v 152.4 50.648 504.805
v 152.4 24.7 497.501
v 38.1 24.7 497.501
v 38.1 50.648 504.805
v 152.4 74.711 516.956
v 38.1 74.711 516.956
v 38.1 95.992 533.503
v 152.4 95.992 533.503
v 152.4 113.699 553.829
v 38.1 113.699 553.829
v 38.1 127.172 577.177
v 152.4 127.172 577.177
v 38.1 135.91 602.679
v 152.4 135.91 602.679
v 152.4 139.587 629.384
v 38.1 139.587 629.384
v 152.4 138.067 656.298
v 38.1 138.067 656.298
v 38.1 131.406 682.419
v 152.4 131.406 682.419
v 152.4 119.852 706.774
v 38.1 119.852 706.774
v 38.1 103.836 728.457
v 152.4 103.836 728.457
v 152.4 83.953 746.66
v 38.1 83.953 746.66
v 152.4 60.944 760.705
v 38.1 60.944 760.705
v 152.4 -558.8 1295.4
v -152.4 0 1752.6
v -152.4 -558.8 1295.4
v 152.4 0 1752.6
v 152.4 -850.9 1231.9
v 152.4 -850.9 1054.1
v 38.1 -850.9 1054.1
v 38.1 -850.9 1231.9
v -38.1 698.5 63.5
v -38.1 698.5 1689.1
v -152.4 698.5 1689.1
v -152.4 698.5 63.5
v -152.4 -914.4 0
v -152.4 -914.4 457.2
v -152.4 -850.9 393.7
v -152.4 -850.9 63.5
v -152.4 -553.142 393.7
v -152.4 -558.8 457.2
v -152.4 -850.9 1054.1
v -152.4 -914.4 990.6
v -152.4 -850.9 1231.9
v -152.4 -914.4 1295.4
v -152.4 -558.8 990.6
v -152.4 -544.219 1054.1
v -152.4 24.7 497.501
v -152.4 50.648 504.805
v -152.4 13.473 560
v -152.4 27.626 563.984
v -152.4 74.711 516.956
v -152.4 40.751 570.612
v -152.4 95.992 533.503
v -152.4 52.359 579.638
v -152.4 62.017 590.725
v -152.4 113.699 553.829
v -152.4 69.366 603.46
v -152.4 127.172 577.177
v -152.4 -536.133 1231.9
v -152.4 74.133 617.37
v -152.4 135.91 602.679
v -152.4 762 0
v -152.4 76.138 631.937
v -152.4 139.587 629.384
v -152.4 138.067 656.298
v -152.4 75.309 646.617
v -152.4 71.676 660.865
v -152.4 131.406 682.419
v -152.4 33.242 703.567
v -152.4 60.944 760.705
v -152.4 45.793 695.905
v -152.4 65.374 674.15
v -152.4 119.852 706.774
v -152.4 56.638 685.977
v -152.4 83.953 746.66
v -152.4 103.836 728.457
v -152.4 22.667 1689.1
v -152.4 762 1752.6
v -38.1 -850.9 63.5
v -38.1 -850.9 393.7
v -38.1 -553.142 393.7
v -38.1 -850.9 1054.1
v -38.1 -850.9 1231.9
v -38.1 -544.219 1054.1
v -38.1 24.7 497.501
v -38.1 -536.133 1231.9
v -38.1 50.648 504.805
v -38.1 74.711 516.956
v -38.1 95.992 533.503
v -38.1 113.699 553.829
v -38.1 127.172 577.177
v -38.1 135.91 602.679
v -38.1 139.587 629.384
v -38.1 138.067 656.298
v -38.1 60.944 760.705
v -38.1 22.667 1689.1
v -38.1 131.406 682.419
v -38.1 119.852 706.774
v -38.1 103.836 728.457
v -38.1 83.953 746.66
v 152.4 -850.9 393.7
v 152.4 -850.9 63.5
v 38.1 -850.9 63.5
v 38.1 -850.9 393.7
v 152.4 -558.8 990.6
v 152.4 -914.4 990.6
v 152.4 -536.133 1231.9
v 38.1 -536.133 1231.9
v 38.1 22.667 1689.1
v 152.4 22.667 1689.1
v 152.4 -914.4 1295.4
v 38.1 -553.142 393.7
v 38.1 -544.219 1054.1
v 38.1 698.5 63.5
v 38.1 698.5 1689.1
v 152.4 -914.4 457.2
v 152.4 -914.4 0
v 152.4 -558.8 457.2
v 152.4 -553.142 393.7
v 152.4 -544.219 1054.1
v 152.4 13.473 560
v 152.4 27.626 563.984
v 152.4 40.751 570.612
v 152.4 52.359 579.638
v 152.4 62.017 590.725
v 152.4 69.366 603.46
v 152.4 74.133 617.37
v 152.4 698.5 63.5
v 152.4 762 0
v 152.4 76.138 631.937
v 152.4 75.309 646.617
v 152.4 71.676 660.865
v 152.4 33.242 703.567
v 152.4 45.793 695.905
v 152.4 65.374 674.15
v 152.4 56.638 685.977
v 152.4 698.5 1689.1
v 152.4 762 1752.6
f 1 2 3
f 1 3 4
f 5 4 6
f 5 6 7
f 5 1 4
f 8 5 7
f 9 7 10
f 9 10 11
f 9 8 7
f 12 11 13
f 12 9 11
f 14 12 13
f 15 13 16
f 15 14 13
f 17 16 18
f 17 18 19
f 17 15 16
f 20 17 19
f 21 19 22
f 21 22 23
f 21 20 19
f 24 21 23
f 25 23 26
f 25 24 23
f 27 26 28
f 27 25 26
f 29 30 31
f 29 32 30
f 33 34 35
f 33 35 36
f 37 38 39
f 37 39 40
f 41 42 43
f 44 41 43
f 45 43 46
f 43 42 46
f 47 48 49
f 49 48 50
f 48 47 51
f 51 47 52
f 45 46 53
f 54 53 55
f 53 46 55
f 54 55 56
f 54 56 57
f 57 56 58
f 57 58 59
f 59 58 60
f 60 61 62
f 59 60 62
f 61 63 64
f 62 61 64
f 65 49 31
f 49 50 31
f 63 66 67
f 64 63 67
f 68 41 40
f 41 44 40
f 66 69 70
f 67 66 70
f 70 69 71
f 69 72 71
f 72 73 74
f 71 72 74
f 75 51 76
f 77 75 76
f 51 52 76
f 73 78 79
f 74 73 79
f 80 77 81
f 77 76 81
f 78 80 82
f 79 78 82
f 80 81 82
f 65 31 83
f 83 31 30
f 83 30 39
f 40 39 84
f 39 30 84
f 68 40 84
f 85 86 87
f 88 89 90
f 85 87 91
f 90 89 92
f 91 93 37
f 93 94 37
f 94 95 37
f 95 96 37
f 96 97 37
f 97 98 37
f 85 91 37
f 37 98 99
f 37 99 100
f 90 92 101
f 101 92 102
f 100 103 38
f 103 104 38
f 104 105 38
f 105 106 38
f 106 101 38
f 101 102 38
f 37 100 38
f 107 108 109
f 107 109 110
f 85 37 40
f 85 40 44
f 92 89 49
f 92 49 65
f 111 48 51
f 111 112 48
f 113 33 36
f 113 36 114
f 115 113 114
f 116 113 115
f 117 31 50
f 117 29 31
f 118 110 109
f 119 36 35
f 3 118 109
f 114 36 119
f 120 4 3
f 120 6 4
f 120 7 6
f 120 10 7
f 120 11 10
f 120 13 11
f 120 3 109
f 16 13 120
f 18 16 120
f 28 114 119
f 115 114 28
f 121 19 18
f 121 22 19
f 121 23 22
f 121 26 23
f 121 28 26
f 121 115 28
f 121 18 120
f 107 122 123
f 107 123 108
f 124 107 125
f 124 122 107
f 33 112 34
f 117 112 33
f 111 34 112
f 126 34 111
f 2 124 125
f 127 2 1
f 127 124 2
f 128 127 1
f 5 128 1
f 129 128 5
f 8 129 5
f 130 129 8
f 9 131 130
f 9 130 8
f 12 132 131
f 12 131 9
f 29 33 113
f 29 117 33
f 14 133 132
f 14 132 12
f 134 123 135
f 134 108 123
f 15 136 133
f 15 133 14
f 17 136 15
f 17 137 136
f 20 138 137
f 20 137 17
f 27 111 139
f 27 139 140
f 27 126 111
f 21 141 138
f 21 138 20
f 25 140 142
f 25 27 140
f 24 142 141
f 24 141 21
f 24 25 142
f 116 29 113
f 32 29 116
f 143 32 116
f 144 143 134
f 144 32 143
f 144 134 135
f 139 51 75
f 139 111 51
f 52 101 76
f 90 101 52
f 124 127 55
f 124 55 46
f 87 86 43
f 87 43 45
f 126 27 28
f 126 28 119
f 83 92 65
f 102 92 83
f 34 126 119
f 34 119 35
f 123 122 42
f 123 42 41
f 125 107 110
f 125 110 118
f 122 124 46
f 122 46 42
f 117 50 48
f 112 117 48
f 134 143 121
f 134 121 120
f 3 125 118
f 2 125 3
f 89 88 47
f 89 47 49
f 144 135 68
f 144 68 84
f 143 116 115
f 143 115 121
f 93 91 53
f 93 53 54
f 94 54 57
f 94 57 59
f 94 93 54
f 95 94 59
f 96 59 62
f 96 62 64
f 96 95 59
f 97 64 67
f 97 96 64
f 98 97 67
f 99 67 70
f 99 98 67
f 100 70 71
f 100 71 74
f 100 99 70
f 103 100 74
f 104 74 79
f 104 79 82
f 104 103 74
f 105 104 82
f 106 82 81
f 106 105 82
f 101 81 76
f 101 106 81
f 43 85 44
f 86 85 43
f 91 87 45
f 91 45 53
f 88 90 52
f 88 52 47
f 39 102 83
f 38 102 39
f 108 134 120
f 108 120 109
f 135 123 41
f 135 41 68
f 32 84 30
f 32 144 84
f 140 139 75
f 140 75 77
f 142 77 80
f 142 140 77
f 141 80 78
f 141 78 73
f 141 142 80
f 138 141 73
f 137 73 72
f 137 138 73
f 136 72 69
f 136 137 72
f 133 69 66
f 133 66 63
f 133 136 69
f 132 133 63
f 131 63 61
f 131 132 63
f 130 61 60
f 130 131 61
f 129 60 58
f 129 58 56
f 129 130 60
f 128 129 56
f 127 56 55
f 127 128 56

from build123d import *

# Parameters (mm, degrees)
F1_DEPTH = 38.1
F3_DEPTH = 152.4


with BuildPart() as f1:
    # F0 (on Right) → F1 (new body, symmetric)
    with BuildSketch(Plane.YZ):
        with BuildLine():
            ThreePointArc((33.2424010234, 703.5666301797), (75.487634561, 624.6049517374), (13.4725780266, 560.0004690593))
            Line((13.4725780266, 560.0004690593), (-558.8, 457.2))
            Line((-558.8, 457.2), (-914.4, 457.2))
            Line((-914.4, 457.2), (-914.4, 0))
            Line((-914.4, 0), (762, 0))
            Line((762, 0), (762, 1752.6))
            Line((762, 1752.6), (0, 1752.6))
            Line((0, 1752.6), (-558.8, 1295.4))
            Line((-558.8, 1295.4), (-914.4, 1295.4))
            Line((-914.4, 1295.4), (-914.4, 990.6))
            Line((-914.4, 990.6), (-558.8, 990.6))
            Line((-558.8, 990.6), (33.2424010234, 703.5666301797))
        make_face()
    extrude(amount=F1_DEPTH, both=True)

    # F2 (on Right) → F3 (join, symmetric)
    with BuildSketch(Plane.YZ):
        with BuildLine():
            Line((-558.8, 990.6), (33.2424010234, 703.5666301797))
            ThreePointArc((33.2424010234, 703.5666301797), (75.487634561, 624.6049517374), (13.4725780266, 560.0004690593))
            Line((13.4725780266, 560.0004690593), (-558.8, 457.2))
            Line((-558.8, 457.2), (-914.4, 457.2))
            Line((-914.4, 457.2), (-914.4, 0))
            Line((-914.4, 0), (762, 0))
            Line((762, 0), (762, 1752.6))
            Line((762, 1752.6), (0, 1752.6))
            Line((0, 1752.6), (-558.8, 1295.4))
            Line((-558.8, 1295.4), (-914.4, 1295.4))
            Line((-914.4, 1295.4), (-914.4, 990.6))
            Line((-914.4, 990.6), (-558.8, 990.6))
        make_face()
        with BuildLine():
            Line((698.5, 1689.1), (698.5, 63.5))
            Line((698.5, 63.5), (-850.9, 63.5))
            Line((-850.9, 63.5), (-850.9, 393.7))
            Line((-850.9, 393.7), (-553.1418560933, 393.7))
            Line((-553.1418560933, 393.7), (24.699726382, 497.5008599421))
            ThreePointArc((24.699726382, 497.5008599421), (138.3939966952, 615.9424115186), (60.9444018763, 760.7054886627))
            Line((60.9444018763, 760.7054886627), (-544.2186530254, 1054.1))
            Line((-544.2186530254, 1054.1), (-850.9, 1054.1))
            Line((-850.9, 1054.1), (-850.9, 1231.9))
            Line((-850.9, 1231.9), (-536.1328254861, 1231.9))
            Line((-536.1328254861, 1231.9), (22.6671745139, 1689.1))
            Line((22.6671745139, 1689.1), (698.5, 1689.1))
        make_face(mode=Mode.SUBTRACT)
    extrude(amount=F3_DEPTH, both=True)


solid = f1.part
